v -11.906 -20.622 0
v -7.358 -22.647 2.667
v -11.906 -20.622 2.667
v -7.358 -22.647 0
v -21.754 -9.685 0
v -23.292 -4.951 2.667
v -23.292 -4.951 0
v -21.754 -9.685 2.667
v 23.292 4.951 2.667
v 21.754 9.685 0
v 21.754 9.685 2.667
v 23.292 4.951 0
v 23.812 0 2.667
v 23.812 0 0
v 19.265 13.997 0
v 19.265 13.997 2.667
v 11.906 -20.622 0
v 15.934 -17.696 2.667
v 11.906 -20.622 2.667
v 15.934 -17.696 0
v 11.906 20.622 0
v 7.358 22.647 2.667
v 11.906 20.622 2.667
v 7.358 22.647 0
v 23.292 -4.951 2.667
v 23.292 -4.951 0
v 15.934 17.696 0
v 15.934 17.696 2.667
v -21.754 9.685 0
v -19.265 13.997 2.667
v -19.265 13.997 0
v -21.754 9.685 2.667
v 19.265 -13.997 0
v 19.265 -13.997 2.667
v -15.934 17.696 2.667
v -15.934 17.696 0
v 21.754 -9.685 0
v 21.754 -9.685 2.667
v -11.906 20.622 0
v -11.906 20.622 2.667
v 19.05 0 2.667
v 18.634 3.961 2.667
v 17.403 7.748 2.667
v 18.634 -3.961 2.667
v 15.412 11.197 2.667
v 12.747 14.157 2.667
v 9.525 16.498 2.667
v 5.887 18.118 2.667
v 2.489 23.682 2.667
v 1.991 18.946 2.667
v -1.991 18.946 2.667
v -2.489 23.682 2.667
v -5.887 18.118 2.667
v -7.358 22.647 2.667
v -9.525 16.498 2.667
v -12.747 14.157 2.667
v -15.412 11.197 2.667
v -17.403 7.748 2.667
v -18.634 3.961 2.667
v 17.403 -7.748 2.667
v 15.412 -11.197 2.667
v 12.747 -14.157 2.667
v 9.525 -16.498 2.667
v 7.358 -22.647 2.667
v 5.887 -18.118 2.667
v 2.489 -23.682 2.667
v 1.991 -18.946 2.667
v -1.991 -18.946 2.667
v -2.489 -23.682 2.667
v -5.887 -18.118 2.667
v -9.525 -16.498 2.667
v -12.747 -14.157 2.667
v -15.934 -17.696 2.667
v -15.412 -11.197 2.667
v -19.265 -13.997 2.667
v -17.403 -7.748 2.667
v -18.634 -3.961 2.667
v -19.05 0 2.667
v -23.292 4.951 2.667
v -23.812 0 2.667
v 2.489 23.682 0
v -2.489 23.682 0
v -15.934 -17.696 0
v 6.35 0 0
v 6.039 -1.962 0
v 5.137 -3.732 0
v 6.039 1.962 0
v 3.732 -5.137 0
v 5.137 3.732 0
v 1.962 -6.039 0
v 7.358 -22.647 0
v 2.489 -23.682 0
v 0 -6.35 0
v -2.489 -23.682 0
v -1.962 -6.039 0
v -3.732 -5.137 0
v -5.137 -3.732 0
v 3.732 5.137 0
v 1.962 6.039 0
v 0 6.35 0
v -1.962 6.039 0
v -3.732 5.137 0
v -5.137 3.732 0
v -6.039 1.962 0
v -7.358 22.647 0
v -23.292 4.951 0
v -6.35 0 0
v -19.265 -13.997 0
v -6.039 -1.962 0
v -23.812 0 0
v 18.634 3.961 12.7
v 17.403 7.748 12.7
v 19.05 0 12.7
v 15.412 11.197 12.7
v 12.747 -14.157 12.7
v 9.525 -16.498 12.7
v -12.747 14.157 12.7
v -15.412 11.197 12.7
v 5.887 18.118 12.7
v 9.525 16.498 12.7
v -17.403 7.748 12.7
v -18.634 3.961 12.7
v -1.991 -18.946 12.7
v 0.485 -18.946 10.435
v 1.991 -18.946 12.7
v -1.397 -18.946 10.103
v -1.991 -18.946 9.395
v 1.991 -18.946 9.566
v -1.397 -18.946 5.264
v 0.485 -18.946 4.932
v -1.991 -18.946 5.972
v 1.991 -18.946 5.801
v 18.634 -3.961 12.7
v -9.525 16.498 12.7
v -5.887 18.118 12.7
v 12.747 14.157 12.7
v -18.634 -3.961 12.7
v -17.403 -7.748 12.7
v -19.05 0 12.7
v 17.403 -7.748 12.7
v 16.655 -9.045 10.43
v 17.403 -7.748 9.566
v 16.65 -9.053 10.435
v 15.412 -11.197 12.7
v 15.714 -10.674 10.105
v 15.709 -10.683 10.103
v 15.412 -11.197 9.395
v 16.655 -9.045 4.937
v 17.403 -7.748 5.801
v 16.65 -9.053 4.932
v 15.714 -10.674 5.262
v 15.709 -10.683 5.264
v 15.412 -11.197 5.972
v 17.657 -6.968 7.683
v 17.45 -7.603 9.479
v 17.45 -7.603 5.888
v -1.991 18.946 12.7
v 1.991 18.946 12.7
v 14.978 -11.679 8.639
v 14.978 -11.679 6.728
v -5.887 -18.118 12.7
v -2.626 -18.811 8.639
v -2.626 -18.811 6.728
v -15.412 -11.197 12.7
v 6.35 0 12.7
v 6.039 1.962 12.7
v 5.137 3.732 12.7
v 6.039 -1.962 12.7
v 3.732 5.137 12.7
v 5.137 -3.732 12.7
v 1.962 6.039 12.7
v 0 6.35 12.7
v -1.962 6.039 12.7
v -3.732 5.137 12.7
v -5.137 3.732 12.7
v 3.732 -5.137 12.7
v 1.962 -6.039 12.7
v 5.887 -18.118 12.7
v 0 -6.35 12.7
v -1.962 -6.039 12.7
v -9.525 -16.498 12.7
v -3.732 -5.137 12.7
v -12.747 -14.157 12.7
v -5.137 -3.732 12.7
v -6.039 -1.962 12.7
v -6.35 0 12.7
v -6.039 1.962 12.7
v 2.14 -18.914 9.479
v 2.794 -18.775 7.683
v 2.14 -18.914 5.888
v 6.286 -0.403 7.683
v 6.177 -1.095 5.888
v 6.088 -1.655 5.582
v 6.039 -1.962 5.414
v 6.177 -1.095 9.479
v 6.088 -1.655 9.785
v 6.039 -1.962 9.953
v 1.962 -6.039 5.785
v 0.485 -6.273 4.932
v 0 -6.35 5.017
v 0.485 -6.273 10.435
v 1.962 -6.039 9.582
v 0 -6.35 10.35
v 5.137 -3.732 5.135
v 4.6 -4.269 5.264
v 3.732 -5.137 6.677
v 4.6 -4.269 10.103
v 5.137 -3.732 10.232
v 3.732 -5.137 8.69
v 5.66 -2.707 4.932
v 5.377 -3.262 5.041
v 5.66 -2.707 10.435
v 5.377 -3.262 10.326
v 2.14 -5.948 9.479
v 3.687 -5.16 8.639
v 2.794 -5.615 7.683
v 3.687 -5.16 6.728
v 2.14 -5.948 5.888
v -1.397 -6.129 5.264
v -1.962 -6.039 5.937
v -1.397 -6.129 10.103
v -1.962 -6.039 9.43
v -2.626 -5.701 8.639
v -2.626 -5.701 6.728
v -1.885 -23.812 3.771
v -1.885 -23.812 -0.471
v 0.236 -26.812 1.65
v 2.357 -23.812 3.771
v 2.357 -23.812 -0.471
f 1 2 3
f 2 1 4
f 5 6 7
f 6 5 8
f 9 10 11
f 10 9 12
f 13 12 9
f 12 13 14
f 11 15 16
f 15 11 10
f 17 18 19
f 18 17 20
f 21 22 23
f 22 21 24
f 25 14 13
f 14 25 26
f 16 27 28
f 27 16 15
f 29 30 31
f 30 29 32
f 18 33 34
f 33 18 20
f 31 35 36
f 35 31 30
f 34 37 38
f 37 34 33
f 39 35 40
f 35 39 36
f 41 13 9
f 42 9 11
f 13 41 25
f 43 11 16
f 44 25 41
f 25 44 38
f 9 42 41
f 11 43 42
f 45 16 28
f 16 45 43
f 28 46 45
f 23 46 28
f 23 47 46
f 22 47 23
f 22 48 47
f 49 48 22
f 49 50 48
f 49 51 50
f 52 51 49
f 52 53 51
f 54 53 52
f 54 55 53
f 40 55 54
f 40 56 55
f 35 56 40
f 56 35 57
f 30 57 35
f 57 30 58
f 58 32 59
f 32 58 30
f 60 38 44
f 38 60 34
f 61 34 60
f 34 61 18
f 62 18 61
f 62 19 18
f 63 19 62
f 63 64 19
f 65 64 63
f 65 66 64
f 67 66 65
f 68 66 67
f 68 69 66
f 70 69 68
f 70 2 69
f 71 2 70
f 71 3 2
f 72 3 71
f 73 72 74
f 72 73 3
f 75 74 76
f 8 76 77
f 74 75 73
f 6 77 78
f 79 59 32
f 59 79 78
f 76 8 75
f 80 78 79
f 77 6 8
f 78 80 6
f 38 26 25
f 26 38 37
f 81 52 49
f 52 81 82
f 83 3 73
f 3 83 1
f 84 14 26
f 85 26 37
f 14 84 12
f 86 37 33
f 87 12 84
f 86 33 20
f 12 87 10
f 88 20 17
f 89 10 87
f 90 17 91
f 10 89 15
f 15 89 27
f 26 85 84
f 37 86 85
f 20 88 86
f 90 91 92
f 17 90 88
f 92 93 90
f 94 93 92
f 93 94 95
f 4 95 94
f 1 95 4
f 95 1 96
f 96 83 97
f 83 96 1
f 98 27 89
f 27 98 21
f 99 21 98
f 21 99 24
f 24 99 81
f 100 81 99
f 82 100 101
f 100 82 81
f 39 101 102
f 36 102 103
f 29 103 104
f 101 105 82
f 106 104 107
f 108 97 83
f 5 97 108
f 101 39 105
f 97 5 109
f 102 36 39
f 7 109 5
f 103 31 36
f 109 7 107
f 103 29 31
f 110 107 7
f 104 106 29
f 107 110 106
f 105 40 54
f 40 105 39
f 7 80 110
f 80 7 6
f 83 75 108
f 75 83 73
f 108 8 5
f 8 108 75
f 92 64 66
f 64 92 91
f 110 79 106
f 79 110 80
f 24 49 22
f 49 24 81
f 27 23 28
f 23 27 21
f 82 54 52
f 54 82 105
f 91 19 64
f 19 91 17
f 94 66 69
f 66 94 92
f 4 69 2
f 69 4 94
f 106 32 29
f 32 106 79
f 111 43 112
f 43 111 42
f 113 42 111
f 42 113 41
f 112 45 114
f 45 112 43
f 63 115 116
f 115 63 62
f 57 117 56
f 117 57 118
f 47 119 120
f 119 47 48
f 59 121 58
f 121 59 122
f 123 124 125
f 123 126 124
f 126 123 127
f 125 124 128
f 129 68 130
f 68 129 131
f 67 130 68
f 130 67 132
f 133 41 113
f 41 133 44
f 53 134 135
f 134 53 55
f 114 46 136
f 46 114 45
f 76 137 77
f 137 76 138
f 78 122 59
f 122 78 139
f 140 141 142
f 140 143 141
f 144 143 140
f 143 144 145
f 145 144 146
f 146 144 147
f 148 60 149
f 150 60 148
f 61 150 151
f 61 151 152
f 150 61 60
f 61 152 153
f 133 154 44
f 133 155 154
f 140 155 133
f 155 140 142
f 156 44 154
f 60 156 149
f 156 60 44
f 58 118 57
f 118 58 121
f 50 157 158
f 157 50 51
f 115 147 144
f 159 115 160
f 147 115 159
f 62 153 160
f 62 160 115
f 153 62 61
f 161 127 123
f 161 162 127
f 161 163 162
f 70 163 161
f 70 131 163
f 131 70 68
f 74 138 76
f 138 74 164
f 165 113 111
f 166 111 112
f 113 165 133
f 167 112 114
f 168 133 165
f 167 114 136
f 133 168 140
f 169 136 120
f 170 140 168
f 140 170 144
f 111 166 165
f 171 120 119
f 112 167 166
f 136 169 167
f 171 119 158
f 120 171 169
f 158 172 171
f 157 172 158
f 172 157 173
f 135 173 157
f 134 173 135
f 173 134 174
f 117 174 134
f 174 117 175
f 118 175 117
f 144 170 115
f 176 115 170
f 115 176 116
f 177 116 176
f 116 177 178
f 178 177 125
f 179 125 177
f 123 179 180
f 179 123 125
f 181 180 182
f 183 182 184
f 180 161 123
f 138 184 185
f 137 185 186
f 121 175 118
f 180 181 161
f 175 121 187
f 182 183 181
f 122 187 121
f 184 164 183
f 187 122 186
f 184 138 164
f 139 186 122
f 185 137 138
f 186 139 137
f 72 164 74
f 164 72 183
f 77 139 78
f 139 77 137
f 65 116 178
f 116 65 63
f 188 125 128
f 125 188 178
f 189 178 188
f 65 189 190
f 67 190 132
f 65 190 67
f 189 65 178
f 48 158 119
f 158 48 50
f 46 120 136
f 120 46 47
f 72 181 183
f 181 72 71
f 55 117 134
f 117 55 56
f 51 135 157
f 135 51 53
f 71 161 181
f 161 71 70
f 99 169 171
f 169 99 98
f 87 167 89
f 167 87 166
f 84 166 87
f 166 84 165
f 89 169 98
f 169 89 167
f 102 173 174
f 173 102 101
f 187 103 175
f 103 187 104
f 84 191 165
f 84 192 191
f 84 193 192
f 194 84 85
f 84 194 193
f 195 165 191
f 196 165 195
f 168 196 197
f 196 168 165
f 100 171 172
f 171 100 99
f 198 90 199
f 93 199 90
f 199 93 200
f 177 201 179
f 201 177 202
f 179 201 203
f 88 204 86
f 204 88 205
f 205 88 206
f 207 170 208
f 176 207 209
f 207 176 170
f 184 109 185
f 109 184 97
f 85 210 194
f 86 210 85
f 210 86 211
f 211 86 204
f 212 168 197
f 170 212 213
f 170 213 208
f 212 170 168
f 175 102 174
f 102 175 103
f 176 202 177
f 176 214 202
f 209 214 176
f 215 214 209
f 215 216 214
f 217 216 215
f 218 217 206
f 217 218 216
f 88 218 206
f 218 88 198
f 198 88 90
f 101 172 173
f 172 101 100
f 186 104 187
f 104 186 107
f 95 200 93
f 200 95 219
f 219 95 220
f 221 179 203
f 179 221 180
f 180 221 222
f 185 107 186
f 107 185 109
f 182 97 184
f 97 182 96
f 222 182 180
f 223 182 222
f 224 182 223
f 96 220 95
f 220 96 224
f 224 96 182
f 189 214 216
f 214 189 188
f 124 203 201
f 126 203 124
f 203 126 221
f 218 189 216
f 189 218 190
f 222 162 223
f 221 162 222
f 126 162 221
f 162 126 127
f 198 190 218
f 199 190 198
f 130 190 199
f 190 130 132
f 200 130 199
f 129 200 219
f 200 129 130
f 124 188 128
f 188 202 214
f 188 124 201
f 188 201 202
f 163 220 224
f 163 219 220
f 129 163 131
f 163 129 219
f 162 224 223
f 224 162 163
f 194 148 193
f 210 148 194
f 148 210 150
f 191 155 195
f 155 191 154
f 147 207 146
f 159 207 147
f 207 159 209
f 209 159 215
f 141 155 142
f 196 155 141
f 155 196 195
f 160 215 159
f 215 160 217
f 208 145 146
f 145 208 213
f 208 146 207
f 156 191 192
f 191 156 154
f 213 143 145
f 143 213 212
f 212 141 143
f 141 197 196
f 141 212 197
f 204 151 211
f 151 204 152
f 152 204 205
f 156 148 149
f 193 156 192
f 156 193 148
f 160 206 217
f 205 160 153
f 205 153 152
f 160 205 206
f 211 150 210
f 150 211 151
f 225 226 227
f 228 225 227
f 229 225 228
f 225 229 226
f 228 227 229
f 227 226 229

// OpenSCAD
function mm(i) = i*25.4 ;
thickness = mm(.5);
width = mm(1.5);




module base()
{
	union()
	{
		cylinder(mm(.105),mm(1.875)/2, mm(1.875)/2, 0);
		cylinder(thickness,width/2,width/2,0);
		
	}
		
}


module centerHole()
{
	cylinder(mm(thickness+mm(1)),mm(.5)/2, mm(.5)/2, 0);
}


module sideHole()
{
		{rotate([90, 0, 0]) {
		cylinder(mm(.75),mm(.22)/2,mm(.22)/2,0);
		}
	}
}


module tooth() {

rotate([90, 45, 0]) {

	translate([-1,mm(.105)/2,mm(1.875)/2]) {

		polyhedron(
			points = [
				[3, 0, 0],
				[0, 3, 0],
				[-3, 0, 0],
				[0, -3, 0],
				[0, 0, 3]
			],
			triangles = [
				[0, 1, 2, 3],
				[4, 1, 0],
				[4, 2, 1],
				[4, 3, 2],
				[4, 0, 3]
	]
);
		}
	}
}

module sprocket()
{
	difference(){
		base();
		translate([0,0,mm(-.5)]) {
			centerHole();
			}
		translate([0,0,(thickness/2+mm(.105)/2)]) {
			sideHole();
			}
		{rotate([0, 0, 60]) {
		translate([0,0,(thickness/2+mm(.105)/2)]) {
			sideHole();
				}
			}
		}		
	}
}


sprocket();

tooth();
